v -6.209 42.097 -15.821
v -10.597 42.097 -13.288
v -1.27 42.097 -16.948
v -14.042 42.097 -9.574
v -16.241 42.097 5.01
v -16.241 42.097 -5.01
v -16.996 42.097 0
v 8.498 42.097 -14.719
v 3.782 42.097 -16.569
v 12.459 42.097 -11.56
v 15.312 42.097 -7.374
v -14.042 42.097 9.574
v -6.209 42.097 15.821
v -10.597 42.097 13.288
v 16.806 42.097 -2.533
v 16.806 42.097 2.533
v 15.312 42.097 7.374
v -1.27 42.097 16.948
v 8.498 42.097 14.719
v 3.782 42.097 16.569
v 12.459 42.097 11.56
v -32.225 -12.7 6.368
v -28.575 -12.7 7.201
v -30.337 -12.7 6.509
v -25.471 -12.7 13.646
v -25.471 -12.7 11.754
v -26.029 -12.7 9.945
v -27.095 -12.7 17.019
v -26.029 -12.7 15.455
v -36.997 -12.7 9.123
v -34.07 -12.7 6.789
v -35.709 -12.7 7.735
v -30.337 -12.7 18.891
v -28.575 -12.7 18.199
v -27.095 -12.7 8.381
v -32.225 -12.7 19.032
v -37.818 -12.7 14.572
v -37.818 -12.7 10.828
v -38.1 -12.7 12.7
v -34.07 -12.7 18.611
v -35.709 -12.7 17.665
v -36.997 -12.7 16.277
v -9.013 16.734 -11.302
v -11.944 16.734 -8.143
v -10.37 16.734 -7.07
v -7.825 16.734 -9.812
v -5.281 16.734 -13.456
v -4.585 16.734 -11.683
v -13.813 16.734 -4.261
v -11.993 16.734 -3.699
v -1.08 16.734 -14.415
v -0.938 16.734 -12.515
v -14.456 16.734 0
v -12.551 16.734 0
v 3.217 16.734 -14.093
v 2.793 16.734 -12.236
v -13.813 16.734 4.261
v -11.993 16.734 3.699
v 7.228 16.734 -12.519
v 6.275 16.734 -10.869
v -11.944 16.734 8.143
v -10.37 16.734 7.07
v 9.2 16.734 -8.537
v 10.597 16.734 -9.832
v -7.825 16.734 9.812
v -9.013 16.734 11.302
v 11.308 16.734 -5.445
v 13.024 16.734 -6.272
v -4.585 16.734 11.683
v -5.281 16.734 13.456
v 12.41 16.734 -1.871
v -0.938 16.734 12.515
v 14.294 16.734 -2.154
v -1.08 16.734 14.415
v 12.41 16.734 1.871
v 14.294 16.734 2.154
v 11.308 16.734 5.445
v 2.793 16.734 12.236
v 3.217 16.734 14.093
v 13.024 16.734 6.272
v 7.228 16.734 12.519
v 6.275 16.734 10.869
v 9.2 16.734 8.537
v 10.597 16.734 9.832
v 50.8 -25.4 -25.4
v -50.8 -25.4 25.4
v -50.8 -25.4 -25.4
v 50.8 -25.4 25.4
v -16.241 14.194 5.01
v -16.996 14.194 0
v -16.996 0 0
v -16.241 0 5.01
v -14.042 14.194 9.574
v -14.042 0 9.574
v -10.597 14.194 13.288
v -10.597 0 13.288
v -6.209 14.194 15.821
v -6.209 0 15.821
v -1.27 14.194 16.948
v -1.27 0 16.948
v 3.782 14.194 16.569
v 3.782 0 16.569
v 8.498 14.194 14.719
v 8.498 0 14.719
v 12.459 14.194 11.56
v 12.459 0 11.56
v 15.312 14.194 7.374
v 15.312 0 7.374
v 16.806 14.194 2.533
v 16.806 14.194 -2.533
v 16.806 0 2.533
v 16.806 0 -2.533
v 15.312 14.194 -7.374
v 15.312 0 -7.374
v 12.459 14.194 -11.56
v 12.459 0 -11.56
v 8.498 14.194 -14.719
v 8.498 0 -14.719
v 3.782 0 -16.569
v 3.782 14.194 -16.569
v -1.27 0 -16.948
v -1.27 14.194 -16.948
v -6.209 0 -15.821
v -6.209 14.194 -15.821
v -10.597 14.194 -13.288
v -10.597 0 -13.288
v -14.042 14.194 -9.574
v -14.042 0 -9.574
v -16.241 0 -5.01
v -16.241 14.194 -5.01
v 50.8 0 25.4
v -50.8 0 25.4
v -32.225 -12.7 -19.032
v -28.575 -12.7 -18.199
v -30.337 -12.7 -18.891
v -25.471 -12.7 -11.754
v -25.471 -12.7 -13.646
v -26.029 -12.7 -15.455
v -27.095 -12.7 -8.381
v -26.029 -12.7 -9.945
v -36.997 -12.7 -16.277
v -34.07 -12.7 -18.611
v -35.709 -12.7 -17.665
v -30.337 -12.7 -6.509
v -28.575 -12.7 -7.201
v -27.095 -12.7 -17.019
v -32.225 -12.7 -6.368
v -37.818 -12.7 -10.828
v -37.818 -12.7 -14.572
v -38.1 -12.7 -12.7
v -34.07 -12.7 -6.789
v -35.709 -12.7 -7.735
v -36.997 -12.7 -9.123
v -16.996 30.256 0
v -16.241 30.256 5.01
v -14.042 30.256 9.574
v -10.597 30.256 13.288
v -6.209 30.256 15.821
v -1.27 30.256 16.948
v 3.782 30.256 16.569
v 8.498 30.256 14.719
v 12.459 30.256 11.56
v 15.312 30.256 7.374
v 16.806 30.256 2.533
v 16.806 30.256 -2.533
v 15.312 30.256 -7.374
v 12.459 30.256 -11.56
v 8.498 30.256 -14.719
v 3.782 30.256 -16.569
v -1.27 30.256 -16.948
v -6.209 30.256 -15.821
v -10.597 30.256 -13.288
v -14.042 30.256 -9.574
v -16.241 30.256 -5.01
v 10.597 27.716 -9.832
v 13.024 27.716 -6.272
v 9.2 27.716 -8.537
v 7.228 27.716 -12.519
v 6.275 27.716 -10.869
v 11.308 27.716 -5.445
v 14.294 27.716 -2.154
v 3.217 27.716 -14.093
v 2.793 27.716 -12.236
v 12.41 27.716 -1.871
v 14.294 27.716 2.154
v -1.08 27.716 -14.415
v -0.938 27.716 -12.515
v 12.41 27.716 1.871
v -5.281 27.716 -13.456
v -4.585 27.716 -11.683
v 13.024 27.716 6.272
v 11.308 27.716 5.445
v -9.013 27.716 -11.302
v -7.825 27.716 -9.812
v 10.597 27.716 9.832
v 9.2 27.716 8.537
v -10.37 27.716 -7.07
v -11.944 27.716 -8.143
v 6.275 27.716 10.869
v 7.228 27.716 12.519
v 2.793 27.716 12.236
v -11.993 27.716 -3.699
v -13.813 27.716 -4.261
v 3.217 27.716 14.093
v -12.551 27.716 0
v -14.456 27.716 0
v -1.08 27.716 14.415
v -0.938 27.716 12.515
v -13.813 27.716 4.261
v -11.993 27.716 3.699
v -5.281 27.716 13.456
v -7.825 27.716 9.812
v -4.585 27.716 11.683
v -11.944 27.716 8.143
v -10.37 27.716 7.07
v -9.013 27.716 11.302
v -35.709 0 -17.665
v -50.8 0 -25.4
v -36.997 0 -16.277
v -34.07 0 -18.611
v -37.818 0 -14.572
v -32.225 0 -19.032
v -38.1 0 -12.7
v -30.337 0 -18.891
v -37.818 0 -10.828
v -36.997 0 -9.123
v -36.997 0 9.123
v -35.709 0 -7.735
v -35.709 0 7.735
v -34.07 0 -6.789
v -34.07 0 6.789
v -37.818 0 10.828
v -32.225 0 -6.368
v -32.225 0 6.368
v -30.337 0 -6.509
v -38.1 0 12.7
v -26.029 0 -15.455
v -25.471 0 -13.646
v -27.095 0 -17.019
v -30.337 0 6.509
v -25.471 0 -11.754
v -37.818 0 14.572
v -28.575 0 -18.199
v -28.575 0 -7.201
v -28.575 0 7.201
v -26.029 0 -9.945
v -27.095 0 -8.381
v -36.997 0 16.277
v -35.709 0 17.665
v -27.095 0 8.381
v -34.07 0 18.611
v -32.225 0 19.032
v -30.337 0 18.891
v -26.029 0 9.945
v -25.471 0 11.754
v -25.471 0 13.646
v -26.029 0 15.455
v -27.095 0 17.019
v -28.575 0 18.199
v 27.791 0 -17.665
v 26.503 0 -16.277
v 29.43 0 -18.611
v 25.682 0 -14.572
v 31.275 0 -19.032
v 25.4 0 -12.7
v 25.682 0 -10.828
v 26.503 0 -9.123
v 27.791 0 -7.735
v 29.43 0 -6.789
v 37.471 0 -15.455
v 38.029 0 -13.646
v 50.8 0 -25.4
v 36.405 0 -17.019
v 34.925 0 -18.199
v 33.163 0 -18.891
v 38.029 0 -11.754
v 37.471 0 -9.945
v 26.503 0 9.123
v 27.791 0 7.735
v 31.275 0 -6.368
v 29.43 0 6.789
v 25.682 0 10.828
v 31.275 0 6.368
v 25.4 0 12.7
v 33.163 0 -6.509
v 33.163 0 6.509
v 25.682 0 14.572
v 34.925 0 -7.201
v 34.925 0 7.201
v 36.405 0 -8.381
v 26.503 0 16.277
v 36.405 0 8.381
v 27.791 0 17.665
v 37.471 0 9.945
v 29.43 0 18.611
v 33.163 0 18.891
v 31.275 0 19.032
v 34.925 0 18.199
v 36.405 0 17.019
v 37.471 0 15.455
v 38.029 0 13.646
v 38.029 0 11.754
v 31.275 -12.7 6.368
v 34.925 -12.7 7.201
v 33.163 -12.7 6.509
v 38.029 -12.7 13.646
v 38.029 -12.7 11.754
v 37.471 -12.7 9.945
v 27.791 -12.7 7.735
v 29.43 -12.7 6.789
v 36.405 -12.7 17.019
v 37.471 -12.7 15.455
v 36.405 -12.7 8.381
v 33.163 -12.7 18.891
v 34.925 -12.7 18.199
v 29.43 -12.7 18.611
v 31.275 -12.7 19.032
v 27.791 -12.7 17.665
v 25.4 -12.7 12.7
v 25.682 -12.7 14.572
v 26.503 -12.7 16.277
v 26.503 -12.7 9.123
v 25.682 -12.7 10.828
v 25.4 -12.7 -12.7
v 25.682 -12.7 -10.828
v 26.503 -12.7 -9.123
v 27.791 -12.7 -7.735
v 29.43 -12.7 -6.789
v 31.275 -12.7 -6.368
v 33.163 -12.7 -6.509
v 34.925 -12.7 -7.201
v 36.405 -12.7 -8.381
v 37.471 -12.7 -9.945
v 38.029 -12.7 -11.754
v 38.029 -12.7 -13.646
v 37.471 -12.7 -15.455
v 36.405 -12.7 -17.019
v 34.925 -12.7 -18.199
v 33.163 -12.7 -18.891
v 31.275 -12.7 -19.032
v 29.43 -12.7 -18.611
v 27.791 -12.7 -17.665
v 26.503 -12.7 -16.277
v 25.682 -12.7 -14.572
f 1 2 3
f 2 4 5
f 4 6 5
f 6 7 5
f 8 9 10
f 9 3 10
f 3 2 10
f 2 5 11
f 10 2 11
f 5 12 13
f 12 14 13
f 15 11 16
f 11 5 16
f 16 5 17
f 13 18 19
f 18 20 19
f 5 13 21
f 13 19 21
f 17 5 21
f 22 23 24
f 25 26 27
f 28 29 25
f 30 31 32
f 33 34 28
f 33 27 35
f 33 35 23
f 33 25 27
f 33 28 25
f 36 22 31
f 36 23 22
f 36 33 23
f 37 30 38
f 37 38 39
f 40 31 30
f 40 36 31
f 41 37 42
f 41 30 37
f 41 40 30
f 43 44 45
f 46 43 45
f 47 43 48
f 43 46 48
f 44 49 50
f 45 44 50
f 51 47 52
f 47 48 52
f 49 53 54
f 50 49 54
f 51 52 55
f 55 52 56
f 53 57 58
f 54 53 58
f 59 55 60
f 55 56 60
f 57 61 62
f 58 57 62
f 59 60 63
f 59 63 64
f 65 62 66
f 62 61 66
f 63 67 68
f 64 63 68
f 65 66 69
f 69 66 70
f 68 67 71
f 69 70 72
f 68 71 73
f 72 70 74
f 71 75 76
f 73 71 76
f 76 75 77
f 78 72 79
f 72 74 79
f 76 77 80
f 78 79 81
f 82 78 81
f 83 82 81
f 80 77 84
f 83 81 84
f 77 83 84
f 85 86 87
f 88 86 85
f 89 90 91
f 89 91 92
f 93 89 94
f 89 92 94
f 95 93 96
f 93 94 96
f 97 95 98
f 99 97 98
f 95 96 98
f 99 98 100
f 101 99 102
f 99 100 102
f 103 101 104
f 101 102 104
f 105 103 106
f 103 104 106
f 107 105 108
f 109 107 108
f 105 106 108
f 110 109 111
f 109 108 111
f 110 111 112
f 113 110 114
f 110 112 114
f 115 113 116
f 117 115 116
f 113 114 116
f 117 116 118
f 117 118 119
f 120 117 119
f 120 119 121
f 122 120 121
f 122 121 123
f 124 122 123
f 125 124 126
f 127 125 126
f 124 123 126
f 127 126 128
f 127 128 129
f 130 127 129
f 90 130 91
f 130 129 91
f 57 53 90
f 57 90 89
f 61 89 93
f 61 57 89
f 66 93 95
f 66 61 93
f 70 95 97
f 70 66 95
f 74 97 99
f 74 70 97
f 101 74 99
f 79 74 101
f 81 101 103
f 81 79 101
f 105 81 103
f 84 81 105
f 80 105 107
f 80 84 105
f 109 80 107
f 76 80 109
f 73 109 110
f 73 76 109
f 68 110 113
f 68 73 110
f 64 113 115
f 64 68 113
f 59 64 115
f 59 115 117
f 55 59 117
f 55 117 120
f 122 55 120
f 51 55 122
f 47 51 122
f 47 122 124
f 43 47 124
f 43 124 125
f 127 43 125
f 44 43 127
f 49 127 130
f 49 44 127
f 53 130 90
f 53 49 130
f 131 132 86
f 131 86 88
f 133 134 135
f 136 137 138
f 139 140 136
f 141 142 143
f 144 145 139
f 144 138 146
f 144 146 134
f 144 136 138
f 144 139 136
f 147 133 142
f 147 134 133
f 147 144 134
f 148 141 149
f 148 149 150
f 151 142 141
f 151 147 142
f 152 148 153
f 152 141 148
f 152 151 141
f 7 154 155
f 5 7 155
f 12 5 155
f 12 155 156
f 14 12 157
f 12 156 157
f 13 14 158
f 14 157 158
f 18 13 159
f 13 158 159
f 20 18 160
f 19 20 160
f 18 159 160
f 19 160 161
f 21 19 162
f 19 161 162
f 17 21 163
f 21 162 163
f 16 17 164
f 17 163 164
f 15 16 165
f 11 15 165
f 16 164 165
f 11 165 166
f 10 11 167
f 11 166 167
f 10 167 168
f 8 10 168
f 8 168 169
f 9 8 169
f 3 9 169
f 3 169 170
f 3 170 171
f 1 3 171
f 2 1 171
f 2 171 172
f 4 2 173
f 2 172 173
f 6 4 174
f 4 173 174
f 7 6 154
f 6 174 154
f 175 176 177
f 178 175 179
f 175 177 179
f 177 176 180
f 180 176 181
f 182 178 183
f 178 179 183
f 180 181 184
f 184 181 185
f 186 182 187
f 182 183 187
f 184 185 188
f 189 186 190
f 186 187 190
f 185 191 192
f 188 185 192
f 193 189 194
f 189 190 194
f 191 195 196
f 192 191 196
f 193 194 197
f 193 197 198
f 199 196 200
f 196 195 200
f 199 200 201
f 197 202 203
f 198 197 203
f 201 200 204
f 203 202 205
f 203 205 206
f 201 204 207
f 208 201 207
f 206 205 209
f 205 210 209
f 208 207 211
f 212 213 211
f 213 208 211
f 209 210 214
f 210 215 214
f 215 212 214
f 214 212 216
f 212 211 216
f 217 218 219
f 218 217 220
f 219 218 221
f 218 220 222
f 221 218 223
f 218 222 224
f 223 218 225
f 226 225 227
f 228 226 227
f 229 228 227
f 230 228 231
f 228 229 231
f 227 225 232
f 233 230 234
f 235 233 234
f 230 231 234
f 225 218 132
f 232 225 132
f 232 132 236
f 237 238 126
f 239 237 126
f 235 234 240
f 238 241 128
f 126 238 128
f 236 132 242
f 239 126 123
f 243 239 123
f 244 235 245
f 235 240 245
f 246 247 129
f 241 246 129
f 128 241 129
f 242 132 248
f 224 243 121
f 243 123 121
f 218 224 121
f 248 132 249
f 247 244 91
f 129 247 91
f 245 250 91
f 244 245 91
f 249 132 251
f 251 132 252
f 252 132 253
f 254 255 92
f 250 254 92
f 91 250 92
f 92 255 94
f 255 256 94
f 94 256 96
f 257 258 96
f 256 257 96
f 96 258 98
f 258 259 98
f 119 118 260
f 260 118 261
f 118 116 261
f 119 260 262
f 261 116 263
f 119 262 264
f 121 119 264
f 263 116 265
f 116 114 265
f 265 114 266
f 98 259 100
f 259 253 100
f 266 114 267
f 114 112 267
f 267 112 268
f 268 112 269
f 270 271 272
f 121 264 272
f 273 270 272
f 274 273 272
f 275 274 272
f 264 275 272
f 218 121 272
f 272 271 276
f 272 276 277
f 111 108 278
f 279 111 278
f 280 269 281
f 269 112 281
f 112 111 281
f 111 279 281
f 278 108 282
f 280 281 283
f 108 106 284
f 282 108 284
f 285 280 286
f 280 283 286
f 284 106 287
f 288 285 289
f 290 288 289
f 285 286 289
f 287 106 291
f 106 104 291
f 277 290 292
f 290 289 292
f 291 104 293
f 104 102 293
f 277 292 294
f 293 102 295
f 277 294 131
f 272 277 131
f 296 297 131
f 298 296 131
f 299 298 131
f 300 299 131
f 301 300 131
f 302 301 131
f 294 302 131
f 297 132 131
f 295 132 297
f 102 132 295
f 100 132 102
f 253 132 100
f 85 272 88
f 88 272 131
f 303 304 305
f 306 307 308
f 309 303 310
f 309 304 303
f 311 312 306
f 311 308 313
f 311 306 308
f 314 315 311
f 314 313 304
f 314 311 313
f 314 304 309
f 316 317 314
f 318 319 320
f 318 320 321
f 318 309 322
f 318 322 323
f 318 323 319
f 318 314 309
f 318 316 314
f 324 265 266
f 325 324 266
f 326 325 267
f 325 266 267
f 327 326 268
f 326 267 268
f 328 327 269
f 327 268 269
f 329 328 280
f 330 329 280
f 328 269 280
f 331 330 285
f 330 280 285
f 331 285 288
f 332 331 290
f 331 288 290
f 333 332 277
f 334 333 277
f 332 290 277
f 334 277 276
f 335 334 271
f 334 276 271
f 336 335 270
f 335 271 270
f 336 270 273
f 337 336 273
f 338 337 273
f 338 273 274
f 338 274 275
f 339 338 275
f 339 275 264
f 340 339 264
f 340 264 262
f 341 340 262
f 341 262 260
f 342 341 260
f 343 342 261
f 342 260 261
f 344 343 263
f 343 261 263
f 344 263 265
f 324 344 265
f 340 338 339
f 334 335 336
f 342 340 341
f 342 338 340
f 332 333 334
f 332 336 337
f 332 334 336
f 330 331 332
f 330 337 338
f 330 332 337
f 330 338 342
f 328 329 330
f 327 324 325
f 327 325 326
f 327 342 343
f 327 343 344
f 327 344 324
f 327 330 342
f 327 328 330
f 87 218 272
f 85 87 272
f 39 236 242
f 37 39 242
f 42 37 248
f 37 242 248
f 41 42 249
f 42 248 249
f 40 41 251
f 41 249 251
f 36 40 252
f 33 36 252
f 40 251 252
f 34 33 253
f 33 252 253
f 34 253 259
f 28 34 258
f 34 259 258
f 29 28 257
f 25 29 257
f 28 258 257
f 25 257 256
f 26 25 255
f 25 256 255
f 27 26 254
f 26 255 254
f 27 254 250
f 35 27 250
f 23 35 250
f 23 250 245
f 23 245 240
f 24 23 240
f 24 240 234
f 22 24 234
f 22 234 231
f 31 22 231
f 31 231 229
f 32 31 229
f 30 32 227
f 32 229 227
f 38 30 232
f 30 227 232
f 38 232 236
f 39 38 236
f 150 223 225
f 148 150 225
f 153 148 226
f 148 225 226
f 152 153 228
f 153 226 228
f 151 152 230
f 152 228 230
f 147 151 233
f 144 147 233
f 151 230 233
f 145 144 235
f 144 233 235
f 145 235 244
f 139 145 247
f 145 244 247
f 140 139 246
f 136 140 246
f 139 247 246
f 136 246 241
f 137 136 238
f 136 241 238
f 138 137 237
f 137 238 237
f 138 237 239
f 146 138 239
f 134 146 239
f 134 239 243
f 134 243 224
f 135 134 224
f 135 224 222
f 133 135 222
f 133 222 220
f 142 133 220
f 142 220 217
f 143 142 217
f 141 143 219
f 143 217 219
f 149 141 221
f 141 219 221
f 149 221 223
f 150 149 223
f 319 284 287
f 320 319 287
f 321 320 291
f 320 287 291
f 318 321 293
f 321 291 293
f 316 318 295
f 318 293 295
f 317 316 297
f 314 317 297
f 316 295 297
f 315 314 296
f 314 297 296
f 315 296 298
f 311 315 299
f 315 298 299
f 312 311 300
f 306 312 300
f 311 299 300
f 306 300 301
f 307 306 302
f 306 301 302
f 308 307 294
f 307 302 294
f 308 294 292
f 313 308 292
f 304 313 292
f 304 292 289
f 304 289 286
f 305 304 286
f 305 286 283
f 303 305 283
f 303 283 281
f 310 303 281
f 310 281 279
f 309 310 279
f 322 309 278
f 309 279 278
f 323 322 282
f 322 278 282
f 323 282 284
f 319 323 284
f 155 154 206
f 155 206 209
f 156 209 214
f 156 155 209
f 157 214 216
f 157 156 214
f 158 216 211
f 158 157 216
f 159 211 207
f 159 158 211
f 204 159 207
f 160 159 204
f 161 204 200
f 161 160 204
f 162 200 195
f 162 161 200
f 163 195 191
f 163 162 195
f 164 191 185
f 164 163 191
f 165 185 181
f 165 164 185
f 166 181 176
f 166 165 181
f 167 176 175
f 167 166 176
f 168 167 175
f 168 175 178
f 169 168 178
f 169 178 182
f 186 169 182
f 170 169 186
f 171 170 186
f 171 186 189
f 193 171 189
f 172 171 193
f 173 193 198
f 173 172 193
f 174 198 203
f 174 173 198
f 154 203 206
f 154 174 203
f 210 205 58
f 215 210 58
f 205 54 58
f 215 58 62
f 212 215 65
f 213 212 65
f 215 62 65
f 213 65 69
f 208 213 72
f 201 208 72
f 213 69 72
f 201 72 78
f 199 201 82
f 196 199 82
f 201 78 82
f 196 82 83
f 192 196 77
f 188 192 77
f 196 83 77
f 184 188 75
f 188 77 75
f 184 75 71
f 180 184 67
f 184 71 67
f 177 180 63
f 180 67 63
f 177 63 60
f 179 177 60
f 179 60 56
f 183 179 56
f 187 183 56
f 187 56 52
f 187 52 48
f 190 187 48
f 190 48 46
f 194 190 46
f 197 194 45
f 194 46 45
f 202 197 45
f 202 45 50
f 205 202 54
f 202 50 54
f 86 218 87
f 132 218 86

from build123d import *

# Parameters (mm, degrees)
F0_W     = 101.6
F0_H     = 50.8
F1_DEPTH = 25.4
F2_R     = 6.35
F3_DEPTH = 12.7
F6_SIZE  = 2.54


with BuildPart() as f1:
    # F0 (on Front) → F1 (new body)
    with BuildSketch(Plane.XZ):
        Rectangle(F0_W, F0_H)
    extrude(amount=F1_DEPTH)

    # F2 (on face) → F3 (cut)
    with BuildSketch(Plane(origin=(0, 0, 0), x_dir=(-1, 0, 0), z_dir=(0, 1, 0))):
        with Locations((31.75, -12.7)):
            Circle(F2_R)
        with Locations((-31.75, 12.7)):
            Circle(F2_R)
        with Locations((-31.75, -12.7)):
            Circle(F2_R)
        with Locations((31.75, 12.7)):
            Circle(F2_R)
    extrude(amount=-F3_DEPTH, mode=Mode.SUBTRACT)

    # F4 (on Top) → F5 (revolve)
    with BuildSketch(Plane.XY):
        Polygon((-16.995588, 0), (0, 0), (0, 42.096764), (-16.995588, 42.096764), (-16.995588, 27.715884), (-12.550589, 27.715884), (-12.550589, 16.734118), (-16.995588, 16.734118), align=None)
    revolve(axis=Axis((0, 21.048382, 0), (0, 1, 0)))

    # F6
    f6_edges = [f1.edges().sort_by_distance(p)[0] for p in [
        (16.995588, 16.734118, 0),
        (16.995588, 27.715884, 0),
    ]]
    chamfer(f6_edges, length=F6_SIZE)


solid = f1.part
